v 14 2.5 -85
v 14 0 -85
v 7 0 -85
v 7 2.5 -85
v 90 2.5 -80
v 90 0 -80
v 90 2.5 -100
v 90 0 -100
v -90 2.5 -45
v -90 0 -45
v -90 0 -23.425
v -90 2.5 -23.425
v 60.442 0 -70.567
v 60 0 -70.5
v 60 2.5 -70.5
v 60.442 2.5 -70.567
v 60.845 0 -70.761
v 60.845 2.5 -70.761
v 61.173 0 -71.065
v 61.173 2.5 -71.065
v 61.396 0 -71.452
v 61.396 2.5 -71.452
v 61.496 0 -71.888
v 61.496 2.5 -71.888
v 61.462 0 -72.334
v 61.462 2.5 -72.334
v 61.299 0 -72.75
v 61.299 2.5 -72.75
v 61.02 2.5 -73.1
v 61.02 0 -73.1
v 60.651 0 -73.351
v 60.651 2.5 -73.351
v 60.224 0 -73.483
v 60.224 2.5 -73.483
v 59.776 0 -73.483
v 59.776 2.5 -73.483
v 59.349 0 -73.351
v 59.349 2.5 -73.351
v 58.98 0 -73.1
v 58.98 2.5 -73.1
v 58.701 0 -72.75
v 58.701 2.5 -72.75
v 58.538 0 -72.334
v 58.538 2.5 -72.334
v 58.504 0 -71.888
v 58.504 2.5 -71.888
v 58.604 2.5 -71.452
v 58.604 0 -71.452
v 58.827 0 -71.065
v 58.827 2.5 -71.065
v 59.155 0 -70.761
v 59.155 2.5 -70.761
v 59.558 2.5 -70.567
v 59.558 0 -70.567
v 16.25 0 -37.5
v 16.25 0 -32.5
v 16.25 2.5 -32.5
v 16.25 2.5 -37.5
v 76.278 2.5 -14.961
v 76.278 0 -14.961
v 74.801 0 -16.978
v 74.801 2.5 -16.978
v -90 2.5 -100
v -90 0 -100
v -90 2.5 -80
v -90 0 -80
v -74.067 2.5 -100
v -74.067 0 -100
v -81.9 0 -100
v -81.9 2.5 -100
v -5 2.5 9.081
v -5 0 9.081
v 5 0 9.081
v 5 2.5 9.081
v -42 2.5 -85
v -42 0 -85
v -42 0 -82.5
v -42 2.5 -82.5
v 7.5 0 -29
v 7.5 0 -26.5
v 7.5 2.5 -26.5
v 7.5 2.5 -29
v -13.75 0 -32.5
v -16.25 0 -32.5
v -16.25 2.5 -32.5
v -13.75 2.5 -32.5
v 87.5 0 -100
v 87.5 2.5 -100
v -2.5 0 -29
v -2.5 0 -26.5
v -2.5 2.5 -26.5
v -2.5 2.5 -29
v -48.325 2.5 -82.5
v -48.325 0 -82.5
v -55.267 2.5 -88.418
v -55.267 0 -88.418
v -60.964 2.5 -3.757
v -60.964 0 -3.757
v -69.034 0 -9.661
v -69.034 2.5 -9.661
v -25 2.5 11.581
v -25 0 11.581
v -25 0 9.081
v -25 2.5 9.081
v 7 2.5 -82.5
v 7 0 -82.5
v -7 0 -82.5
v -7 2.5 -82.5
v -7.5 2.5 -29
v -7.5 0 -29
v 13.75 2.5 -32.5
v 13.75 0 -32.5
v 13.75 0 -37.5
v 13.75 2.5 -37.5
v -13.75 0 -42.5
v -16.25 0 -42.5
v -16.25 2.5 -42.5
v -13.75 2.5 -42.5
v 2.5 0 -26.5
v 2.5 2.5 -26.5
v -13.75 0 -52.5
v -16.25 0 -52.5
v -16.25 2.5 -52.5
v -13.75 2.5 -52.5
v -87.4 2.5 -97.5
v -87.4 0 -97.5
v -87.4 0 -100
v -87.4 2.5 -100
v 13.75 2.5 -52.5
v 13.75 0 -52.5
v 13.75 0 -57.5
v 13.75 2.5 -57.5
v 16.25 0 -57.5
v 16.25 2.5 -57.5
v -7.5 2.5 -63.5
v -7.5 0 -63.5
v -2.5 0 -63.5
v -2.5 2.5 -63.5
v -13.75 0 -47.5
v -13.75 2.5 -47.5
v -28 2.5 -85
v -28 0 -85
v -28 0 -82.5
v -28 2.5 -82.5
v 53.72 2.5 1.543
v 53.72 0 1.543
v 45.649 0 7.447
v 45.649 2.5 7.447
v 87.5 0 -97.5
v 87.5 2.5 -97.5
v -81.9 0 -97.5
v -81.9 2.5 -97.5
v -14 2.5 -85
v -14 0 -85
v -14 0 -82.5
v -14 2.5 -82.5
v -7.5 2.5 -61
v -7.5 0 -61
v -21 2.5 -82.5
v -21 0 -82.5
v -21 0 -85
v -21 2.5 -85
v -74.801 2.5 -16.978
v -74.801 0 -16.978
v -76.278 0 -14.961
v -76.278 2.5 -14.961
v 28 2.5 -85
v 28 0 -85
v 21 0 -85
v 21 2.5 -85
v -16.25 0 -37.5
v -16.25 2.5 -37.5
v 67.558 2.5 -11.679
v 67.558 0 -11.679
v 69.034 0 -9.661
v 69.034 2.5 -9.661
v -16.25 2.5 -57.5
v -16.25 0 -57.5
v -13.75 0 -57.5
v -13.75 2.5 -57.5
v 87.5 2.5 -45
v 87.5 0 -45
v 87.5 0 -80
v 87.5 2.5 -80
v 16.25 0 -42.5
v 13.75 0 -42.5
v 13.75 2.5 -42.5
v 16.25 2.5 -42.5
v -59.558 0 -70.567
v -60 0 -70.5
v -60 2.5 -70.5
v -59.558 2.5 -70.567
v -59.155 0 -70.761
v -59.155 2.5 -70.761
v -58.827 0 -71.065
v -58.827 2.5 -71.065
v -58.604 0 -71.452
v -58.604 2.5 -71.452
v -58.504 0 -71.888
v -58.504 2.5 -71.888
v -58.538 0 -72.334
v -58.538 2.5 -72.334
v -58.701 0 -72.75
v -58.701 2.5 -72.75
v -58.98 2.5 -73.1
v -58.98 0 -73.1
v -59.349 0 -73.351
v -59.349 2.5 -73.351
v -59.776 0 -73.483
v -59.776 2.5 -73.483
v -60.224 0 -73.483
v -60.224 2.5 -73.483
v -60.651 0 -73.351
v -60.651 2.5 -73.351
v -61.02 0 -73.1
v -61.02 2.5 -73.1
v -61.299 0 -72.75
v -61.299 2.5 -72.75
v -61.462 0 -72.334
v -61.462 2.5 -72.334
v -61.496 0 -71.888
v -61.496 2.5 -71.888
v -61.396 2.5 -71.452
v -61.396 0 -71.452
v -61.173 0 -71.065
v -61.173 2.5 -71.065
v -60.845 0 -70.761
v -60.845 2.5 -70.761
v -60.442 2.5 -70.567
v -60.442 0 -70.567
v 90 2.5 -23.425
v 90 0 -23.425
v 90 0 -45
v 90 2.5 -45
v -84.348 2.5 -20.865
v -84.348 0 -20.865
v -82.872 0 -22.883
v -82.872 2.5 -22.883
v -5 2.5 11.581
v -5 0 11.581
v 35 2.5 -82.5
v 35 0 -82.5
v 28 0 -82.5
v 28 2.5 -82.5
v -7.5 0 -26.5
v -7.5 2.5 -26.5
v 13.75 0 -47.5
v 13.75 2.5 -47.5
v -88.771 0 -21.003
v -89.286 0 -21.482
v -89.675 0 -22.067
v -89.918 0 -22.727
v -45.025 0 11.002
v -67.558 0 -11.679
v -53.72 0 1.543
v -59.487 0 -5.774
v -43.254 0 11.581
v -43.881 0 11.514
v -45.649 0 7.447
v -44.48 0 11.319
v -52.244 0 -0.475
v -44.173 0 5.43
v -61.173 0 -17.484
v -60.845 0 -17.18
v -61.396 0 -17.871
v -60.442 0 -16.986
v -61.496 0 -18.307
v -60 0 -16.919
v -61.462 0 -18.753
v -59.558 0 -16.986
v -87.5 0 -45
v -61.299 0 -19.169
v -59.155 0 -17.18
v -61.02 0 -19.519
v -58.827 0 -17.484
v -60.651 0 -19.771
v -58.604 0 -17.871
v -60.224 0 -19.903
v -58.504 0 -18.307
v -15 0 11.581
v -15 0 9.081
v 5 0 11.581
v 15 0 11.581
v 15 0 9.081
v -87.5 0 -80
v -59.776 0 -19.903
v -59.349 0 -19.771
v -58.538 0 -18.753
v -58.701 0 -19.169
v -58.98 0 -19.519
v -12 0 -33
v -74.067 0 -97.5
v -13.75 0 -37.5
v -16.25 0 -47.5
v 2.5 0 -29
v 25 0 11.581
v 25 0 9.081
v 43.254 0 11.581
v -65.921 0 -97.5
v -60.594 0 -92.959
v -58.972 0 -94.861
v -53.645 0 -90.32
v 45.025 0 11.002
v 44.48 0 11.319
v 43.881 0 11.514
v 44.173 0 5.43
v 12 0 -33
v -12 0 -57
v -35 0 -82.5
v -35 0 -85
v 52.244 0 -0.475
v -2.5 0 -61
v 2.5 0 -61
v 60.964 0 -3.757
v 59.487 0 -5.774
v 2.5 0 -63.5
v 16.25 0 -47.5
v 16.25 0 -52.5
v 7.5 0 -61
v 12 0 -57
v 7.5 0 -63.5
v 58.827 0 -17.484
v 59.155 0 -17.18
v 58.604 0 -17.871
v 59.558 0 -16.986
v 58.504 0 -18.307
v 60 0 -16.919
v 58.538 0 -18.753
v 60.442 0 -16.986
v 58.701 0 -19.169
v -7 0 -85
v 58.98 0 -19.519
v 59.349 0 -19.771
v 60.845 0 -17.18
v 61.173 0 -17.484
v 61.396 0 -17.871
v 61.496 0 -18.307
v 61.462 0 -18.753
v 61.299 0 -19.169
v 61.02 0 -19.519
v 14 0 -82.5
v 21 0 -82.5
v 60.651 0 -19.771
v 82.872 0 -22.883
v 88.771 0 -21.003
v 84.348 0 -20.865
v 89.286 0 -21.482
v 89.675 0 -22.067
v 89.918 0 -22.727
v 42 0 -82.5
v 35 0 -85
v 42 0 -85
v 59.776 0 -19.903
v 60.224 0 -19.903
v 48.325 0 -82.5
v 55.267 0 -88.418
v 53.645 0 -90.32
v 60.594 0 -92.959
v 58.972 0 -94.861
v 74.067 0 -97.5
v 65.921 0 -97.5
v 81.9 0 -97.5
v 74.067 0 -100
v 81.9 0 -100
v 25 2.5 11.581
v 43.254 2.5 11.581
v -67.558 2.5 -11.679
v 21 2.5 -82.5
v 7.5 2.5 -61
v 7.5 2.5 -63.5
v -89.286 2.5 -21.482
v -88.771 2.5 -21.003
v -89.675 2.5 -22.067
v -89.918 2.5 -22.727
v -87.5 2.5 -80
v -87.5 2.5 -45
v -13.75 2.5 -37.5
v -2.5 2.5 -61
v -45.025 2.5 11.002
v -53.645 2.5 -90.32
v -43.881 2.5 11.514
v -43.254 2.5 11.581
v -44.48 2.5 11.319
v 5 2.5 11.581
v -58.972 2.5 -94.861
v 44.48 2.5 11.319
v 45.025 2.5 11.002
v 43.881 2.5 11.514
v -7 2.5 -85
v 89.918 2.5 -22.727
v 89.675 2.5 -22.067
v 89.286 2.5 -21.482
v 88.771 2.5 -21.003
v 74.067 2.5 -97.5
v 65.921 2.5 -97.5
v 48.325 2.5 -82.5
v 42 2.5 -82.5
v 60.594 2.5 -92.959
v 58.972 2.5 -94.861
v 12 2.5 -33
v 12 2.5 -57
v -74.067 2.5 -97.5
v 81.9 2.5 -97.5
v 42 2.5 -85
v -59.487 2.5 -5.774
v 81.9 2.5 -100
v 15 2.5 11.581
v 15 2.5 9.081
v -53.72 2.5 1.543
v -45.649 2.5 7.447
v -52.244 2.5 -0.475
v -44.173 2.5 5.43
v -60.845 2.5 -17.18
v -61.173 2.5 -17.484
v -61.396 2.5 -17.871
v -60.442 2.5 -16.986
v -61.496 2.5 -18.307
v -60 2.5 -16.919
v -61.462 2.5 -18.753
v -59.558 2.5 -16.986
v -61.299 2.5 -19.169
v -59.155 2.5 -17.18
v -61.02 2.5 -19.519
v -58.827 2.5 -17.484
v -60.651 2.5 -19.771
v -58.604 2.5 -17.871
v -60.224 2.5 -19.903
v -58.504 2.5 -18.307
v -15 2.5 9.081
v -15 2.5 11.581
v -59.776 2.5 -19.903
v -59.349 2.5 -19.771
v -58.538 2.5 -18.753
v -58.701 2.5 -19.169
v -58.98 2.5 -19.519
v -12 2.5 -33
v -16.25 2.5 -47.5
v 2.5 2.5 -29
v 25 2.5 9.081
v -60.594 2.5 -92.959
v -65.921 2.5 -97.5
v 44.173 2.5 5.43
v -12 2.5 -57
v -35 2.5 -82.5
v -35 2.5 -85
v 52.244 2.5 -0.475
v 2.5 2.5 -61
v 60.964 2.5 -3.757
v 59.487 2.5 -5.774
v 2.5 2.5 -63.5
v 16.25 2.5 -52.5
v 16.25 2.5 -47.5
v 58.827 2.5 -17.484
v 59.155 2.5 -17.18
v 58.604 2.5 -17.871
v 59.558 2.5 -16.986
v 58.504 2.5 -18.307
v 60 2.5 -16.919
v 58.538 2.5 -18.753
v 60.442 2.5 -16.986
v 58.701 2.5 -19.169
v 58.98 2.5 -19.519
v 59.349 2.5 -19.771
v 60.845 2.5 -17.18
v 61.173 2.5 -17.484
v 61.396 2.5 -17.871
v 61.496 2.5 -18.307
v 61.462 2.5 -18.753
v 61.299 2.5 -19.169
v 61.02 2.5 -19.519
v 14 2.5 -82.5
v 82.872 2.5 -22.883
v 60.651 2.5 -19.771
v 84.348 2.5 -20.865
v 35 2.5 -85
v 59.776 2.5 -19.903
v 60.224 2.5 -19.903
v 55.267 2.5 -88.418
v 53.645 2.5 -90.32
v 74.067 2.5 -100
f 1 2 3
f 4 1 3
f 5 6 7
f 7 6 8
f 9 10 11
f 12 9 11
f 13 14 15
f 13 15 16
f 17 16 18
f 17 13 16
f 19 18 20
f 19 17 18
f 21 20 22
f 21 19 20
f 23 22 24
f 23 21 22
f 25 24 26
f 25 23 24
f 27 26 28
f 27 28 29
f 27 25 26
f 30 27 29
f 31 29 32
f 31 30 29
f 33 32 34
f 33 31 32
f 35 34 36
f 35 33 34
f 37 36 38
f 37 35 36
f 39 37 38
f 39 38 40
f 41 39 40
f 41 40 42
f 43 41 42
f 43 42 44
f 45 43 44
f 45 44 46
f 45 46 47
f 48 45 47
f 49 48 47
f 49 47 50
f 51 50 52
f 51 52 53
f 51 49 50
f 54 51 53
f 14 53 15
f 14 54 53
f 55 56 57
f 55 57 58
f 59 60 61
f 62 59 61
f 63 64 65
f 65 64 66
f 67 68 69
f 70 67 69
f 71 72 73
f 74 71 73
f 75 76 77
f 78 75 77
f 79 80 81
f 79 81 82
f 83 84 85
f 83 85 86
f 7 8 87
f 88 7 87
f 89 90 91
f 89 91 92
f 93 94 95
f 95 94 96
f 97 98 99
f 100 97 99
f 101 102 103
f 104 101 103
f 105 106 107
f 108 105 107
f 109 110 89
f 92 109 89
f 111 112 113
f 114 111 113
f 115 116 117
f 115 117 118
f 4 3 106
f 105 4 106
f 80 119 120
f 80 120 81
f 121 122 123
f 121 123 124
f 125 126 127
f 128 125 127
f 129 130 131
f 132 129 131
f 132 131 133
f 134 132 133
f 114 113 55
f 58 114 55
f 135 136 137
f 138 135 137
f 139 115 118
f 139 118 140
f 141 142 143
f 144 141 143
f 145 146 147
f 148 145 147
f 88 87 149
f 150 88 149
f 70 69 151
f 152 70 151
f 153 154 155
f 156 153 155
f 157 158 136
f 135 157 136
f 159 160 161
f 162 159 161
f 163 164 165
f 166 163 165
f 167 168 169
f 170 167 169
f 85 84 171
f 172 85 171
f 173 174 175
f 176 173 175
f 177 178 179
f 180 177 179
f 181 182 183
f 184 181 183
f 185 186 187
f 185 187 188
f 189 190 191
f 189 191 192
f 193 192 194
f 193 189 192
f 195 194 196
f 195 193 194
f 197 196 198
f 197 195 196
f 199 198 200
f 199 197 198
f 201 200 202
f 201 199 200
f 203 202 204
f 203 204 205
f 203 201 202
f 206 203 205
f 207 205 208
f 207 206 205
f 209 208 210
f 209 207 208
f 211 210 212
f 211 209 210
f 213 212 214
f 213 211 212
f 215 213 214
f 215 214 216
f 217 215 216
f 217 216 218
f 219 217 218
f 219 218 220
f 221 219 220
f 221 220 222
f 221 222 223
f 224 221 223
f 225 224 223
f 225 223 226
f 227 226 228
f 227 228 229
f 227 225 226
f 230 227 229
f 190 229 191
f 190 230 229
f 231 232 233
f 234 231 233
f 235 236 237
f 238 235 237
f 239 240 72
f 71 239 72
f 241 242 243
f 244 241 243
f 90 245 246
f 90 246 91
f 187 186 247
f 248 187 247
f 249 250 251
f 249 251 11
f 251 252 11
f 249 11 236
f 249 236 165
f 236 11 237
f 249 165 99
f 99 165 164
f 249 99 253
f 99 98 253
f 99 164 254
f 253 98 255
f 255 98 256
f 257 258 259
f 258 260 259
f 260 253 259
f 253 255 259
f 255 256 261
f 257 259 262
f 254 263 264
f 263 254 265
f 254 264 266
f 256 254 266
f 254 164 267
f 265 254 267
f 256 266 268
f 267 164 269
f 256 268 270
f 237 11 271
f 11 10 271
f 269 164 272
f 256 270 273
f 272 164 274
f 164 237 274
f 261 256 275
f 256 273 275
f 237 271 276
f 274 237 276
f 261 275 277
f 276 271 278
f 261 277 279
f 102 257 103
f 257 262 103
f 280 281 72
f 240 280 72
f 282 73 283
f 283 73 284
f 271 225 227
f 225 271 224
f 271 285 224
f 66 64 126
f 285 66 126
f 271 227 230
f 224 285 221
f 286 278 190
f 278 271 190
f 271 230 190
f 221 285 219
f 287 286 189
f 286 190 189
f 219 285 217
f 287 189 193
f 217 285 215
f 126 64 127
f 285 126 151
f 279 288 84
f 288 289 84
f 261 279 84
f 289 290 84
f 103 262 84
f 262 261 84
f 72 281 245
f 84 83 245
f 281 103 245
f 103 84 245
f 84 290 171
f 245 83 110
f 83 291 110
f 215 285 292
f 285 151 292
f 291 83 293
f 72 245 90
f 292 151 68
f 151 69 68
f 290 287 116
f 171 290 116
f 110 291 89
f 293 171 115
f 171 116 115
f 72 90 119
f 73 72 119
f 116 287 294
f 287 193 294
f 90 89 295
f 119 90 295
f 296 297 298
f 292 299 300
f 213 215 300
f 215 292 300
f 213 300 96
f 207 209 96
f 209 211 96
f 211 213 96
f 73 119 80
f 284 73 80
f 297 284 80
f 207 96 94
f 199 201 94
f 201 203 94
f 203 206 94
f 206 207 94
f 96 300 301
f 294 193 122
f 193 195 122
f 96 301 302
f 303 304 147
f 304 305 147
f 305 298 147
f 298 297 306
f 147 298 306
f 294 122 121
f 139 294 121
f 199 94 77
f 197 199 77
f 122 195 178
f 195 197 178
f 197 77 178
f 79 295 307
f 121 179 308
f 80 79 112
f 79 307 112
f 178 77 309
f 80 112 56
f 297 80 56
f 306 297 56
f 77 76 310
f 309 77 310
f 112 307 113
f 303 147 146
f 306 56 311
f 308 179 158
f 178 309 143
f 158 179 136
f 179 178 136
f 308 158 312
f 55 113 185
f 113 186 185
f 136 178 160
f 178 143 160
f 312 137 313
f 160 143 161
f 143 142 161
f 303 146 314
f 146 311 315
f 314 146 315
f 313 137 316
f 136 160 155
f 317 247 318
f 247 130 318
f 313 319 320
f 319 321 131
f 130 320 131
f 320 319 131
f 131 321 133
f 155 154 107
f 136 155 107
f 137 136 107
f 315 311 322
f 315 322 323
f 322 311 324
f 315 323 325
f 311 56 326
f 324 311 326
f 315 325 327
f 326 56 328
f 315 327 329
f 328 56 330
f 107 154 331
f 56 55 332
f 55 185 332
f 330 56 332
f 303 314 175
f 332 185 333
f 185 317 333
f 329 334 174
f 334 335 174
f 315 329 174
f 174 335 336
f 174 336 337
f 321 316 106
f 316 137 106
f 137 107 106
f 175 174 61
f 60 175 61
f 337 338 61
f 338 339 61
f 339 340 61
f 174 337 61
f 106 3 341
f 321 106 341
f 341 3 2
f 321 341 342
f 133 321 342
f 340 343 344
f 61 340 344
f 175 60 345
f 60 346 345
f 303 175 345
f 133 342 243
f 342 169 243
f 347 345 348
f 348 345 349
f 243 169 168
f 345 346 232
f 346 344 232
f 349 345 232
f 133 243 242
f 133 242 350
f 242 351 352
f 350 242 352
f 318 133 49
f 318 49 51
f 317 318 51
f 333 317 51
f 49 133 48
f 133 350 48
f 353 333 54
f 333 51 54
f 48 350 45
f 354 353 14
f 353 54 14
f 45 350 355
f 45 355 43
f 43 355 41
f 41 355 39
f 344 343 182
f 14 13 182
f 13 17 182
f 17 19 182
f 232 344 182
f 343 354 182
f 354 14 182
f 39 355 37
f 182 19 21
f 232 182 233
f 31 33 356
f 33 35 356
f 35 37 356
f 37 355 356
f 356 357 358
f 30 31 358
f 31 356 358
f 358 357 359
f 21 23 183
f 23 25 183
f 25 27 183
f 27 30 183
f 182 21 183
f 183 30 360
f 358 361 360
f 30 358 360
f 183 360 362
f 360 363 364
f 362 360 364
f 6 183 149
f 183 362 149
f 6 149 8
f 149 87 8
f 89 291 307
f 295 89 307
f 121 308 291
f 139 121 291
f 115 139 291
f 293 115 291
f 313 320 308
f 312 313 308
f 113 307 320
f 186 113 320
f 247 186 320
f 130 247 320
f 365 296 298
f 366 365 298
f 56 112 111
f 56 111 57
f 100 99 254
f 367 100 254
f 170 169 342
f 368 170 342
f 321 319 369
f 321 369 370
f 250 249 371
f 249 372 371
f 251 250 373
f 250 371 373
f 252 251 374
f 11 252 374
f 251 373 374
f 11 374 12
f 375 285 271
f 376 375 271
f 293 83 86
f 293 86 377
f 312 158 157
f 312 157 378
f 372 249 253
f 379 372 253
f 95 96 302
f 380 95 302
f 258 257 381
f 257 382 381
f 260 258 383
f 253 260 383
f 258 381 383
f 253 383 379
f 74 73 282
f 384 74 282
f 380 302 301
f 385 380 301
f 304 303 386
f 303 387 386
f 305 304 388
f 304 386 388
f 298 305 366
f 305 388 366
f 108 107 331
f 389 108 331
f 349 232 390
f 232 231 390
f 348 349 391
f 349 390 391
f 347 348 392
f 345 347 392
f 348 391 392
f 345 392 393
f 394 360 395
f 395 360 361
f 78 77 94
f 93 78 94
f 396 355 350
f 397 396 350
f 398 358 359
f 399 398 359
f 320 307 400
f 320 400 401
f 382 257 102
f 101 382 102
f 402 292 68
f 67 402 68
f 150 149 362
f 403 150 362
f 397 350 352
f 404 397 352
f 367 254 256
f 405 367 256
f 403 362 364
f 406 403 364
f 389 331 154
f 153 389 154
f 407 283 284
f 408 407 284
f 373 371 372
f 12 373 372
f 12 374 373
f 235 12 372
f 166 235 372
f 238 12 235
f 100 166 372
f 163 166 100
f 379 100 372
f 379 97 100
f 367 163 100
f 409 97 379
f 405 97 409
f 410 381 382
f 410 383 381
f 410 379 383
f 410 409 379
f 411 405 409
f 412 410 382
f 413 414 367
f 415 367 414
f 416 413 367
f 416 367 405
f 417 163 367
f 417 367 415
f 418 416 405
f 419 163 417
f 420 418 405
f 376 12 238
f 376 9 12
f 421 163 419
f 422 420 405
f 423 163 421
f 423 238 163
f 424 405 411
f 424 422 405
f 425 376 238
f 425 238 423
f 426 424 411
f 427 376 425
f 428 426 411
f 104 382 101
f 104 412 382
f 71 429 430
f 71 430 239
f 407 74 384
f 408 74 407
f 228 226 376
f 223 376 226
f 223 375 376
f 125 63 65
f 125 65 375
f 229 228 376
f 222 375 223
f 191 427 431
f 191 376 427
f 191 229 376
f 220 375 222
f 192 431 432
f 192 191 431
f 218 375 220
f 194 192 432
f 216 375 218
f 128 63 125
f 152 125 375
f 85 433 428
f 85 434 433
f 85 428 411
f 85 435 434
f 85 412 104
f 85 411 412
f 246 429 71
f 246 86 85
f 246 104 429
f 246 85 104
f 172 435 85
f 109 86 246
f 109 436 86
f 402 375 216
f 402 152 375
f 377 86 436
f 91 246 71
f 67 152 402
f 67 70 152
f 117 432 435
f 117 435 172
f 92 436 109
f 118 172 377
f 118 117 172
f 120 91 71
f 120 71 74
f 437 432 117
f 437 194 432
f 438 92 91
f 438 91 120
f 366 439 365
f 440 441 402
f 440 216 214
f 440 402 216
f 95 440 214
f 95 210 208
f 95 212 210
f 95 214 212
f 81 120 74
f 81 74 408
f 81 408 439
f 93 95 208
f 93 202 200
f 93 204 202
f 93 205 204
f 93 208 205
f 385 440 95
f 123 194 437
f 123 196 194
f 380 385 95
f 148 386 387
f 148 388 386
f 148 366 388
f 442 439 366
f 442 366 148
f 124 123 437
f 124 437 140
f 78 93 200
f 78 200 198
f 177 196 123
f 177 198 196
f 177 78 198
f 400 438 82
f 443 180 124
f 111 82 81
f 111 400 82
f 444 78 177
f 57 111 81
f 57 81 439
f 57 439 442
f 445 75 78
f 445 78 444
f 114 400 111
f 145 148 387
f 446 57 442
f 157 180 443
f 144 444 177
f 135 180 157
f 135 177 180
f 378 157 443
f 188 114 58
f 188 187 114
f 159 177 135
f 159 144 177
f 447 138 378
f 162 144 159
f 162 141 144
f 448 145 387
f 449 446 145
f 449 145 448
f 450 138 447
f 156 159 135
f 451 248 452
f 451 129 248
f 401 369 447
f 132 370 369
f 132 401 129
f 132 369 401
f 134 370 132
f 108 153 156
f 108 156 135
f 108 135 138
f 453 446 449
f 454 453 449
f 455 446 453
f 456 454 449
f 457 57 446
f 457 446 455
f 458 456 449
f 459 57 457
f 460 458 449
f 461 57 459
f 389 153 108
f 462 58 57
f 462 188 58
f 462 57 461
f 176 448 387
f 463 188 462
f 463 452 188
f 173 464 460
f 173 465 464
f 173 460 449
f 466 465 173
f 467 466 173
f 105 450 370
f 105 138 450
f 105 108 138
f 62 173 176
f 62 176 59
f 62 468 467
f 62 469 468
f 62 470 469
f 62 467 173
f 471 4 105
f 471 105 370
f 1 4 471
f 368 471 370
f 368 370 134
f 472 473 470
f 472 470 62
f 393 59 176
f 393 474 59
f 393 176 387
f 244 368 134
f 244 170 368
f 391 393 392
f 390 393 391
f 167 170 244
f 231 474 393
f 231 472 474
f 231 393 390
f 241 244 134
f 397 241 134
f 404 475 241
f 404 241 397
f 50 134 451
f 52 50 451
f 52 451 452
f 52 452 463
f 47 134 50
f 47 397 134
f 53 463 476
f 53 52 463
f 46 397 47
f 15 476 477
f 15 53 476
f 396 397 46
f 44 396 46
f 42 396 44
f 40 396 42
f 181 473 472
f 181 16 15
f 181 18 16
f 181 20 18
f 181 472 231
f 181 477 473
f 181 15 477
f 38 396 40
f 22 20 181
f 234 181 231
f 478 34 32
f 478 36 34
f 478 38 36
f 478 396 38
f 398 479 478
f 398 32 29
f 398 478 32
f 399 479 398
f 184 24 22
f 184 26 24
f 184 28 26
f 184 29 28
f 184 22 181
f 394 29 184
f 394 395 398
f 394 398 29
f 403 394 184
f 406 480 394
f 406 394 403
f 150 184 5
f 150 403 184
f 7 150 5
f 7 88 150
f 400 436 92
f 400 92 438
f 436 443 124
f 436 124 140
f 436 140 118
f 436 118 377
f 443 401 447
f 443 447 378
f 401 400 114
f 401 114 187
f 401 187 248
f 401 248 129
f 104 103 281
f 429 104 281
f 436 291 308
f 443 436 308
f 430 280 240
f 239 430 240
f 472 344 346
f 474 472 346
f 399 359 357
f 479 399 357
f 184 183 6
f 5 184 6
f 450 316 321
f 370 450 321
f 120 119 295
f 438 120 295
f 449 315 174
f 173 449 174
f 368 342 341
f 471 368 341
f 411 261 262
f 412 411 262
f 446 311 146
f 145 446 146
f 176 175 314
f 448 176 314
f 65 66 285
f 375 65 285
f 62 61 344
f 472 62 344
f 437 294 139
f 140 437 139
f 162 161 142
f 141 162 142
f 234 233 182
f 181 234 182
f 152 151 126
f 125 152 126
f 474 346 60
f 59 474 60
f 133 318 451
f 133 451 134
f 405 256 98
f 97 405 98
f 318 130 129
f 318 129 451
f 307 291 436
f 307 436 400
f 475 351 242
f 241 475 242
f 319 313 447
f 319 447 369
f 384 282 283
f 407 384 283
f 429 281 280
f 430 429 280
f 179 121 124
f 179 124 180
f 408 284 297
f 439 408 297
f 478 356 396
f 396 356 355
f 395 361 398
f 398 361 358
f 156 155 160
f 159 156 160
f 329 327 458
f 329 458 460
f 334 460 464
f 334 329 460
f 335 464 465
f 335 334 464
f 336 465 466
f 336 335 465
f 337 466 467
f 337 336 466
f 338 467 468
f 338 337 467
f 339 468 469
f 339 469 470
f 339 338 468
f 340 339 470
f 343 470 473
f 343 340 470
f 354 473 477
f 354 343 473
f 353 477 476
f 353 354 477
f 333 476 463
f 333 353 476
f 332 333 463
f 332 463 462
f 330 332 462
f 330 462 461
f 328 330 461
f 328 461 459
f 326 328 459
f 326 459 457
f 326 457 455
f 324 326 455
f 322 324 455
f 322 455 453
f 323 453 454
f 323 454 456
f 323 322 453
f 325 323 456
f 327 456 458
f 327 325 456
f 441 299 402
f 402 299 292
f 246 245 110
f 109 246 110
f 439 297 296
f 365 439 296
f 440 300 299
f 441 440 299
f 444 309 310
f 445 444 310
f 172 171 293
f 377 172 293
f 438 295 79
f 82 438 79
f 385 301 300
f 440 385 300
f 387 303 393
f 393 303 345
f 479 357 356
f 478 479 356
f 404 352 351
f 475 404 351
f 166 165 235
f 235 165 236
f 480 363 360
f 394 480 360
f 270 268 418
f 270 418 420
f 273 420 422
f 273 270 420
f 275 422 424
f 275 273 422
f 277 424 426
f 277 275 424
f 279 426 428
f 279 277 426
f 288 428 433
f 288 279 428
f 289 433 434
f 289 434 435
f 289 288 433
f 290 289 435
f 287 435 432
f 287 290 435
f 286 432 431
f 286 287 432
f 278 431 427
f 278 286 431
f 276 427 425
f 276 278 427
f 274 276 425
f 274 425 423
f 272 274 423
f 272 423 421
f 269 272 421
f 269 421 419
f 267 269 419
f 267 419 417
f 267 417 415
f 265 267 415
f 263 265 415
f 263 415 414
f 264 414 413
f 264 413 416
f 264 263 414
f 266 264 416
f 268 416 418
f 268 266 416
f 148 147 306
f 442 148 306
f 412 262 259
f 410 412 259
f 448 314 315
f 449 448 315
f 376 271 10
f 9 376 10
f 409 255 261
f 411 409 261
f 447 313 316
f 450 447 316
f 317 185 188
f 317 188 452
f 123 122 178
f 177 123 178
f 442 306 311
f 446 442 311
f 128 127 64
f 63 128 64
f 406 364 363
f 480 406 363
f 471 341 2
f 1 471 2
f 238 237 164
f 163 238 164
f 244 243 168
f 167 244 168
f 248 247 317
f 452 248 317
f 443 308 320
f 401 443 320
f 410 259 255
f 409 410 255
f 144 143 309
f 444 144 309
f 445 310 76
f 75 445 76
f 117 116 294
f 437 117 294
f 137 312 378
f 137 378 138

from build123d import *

# Parameters (mm, degrees)
SKETCH1_R           = 1.5
SKETCH1_W           = 5
SKETCH1_H           = 2.5
SKETCH1_W_2         = 2.5
SKETCH1_H_2         = 5
SKETCH1_W_3         = 24
SKETCH1_H_3         = 24
BOSS_EXTRUDE1_DEPTH = 2.5
FILLET1_R           = 3


with BuildPart() as part:
    # Sketch1 → Boss-Extrude1 (new body)
    with BuildSketch(Plane(origin=(0, 0, 0), x_dir=(1, 0, 0), z_dir=(0, 1, 0))):
        Polygon((42, 82.5), (42, 85), (35, 85), (35, 82.5), (28, 82.5), (28, 85), (21, 85), (21, 82.5), (14, 82.5), (14, 85), (7, 85), (7, 82.5), (-7, 82.5), (-7, 85), (-14, 85), (-14, 82.5), (-21, 82.5), (-21, 85), (-28, 85), (-28, 82.5), (-35, 82.5), (-35, 85), (-42, 85), (-42, 82.5), (-48.324658201, 82.5), (-55.266711269, 88.417765861), (-53.644883744, 90.320310336), (-58.972008275, 94.861427406), (-60.5938358, 92.958882931), (-65.92096033, 97.5), (-74.067282979, 97.5), (-74.067282979, 100), (-81.9, 100), (-81.9, 97.5), (-87.4, 97.5), (-87.4, 100), (-90, 100), (-90, 80), (-87.5, 80), (-87.5, 45), (-90, 45), (-90, 21.902362465), (-44.23398473, -11.580641316), (-25, -11.580641316), (-25, -9.080641316), (-15, -9.080641316), (-15, -11.580641316), (-5, -11.580641316), (-5, -9.080641316), (5, -9.080641316), (5, -11.580641316), (15, -11.580641316), (15, -9.080641316), (25, -9.080641316), (25, -11.580641316), (44.23398473, -11.580641316), (90, 21.902362465), (90, 45), (87.5, 45), (87.5, 80), (90, 80), (90, 100), (87.5, 100), (87.5, 97.5), (81.9, 97.5), (81.9, 100), (74.067282979, 100), (74.067282979, 97.5), (65.92096033, 97.5), (60.593835799, 92.958882931), (58.972008275, 94.861427406), (53.644883744, 90.320310336), (55.266711269, 88.417765861), (48.324658201, 82.5), align=None)
        Polygon((82.872162523, 22.882820213), (84.348313336, 20.865153546), (76.277646669, 14.960550296), (74.801495856, 16.978216962), align=None, mode=Mode.SUBTRACT)
        Polygon((67.558072522, 11.678835545), (69.034223335, 9.661168878), (60.963556668, 3.756565627), (59.487405855, 5.774232294), align=None, mode=Mode.SUBTRACT)
        Polygon((52.243982521, 0.474850877), (53.720133334, -1.54281579), (45.649466667, -7.447419041), (44.173315854, -5.429752374), align=None, mode=Mode.SUBTRACT)
        Polygon((-52.243982521, 0.474850877), (-44.173315854, -5.429752374), (-45.649466667, -7.447419041), (-53.720133334, -1.54281579), align=None, mode=Mode.SUBTRACT)
        Polygon((-59.487405855, 5.774232294), (-60.963556668, 3.756565627), (-69.034223335, 9.661168878), (-67.558072522, 11.678835545), align=None, mode=Mode.SUBTRACT)
        Polygon((-74.801495856, 16.978216962), (-76.277646669, 14.960550296), (-84.348313336, 20.865153546), (-82.872162523, 22.882820213), align=None, mode=Mode.SUBTRACT)
        with Locations(Location((-60, 18.419358684, 0), (0, 0, 270))):
            Circle(SKETCH1_R, mode=Mode.SUBTRACT)
        with Locations((-5, 27.75)):
            Rectangle(SKETCH1_W, SKETCH1_H, mode=Mode.SUBTRACT)
        with Locations((-15, 35)):
            Rectangle(SKETCH1_W_2, SKETCH1_H_2, mode=Mode.SUBTRACT)
        with Locations((5, 27.75)):
            Rectangle(SKETCH1_W, SKETCH1_H, mode=Mode.SUBTRACT)
        with Locations((15, 35)):
            Rectangle(SKETCH1_W_2, SKETCH1_H_2, mode=Mode.SUBTRACT)
        with Locations(Location((60, 18.419358684, 0), (0, 0, 270))):
            Circle(SKETCH1_R, mode=Mode.SUBTRACT)
        with Locations(Location((-60, 72, 0), (0, 0, 270))):
            Circle(SKETCH1_R, mode=Mode.SUBTRACT)
        with Locations((-15, 45)):
            Rectangle(SKETCH1_W_2, SKETCH1_H_2, mode=Mode.SUBTRACT)
        with Locations((-15, 55)):
            Rectangle(SKETCH1_W_2, SKETCH1_H_2, mode=Mode.SUBTRACT)
        with Locations((-5, 62.25)):
            Rectangle(SKETCH1_W, SKETCH1_H, mode=Mode.SUBTRACT)
        with Locations((0, 45)):
            Rectangle(SKETCH1_W_3, SKETCH1_H_3, mode=Mode.SUBTRACT)
        with Locations((15, 45)):
            Rectangle(SKETCH1_W_2, SKETCH1_H_2, mode=Mode.SUBTRACT)
        with Locations((15, 55)):
            Rectangle(SKETCH1_W_2, SKETCH1_H_2, mode=Mode.SUBTRACT)
        with Locations((5, 62.25)):
            Rectangle(SKETCH1_W, SKETCH1_H, mode=Mode.SUBTRACT)
        with Locations(Location((60, 72, 0), (0, 0, 270))):
            Circle(SKETCH1_R, mode=Mode.SUBTRACT)
    extrude(amount=BOSS_EXTRUDE1_DEPTH)

    # Fillet1
    fillet1_edges = [part.edges().sort_by_distance(p)[0] for p in [
        (90, 1.25, -21.902362465),
        (44.23398473, 1.25, 11.580641316),
        (-44.23398473, 1.25, 11.580641316),
        (-90, 1.25, -21.902362465),
    ]]
    fillet(fillet1_edges, radius=FILLET1_R)


solid = part.part
